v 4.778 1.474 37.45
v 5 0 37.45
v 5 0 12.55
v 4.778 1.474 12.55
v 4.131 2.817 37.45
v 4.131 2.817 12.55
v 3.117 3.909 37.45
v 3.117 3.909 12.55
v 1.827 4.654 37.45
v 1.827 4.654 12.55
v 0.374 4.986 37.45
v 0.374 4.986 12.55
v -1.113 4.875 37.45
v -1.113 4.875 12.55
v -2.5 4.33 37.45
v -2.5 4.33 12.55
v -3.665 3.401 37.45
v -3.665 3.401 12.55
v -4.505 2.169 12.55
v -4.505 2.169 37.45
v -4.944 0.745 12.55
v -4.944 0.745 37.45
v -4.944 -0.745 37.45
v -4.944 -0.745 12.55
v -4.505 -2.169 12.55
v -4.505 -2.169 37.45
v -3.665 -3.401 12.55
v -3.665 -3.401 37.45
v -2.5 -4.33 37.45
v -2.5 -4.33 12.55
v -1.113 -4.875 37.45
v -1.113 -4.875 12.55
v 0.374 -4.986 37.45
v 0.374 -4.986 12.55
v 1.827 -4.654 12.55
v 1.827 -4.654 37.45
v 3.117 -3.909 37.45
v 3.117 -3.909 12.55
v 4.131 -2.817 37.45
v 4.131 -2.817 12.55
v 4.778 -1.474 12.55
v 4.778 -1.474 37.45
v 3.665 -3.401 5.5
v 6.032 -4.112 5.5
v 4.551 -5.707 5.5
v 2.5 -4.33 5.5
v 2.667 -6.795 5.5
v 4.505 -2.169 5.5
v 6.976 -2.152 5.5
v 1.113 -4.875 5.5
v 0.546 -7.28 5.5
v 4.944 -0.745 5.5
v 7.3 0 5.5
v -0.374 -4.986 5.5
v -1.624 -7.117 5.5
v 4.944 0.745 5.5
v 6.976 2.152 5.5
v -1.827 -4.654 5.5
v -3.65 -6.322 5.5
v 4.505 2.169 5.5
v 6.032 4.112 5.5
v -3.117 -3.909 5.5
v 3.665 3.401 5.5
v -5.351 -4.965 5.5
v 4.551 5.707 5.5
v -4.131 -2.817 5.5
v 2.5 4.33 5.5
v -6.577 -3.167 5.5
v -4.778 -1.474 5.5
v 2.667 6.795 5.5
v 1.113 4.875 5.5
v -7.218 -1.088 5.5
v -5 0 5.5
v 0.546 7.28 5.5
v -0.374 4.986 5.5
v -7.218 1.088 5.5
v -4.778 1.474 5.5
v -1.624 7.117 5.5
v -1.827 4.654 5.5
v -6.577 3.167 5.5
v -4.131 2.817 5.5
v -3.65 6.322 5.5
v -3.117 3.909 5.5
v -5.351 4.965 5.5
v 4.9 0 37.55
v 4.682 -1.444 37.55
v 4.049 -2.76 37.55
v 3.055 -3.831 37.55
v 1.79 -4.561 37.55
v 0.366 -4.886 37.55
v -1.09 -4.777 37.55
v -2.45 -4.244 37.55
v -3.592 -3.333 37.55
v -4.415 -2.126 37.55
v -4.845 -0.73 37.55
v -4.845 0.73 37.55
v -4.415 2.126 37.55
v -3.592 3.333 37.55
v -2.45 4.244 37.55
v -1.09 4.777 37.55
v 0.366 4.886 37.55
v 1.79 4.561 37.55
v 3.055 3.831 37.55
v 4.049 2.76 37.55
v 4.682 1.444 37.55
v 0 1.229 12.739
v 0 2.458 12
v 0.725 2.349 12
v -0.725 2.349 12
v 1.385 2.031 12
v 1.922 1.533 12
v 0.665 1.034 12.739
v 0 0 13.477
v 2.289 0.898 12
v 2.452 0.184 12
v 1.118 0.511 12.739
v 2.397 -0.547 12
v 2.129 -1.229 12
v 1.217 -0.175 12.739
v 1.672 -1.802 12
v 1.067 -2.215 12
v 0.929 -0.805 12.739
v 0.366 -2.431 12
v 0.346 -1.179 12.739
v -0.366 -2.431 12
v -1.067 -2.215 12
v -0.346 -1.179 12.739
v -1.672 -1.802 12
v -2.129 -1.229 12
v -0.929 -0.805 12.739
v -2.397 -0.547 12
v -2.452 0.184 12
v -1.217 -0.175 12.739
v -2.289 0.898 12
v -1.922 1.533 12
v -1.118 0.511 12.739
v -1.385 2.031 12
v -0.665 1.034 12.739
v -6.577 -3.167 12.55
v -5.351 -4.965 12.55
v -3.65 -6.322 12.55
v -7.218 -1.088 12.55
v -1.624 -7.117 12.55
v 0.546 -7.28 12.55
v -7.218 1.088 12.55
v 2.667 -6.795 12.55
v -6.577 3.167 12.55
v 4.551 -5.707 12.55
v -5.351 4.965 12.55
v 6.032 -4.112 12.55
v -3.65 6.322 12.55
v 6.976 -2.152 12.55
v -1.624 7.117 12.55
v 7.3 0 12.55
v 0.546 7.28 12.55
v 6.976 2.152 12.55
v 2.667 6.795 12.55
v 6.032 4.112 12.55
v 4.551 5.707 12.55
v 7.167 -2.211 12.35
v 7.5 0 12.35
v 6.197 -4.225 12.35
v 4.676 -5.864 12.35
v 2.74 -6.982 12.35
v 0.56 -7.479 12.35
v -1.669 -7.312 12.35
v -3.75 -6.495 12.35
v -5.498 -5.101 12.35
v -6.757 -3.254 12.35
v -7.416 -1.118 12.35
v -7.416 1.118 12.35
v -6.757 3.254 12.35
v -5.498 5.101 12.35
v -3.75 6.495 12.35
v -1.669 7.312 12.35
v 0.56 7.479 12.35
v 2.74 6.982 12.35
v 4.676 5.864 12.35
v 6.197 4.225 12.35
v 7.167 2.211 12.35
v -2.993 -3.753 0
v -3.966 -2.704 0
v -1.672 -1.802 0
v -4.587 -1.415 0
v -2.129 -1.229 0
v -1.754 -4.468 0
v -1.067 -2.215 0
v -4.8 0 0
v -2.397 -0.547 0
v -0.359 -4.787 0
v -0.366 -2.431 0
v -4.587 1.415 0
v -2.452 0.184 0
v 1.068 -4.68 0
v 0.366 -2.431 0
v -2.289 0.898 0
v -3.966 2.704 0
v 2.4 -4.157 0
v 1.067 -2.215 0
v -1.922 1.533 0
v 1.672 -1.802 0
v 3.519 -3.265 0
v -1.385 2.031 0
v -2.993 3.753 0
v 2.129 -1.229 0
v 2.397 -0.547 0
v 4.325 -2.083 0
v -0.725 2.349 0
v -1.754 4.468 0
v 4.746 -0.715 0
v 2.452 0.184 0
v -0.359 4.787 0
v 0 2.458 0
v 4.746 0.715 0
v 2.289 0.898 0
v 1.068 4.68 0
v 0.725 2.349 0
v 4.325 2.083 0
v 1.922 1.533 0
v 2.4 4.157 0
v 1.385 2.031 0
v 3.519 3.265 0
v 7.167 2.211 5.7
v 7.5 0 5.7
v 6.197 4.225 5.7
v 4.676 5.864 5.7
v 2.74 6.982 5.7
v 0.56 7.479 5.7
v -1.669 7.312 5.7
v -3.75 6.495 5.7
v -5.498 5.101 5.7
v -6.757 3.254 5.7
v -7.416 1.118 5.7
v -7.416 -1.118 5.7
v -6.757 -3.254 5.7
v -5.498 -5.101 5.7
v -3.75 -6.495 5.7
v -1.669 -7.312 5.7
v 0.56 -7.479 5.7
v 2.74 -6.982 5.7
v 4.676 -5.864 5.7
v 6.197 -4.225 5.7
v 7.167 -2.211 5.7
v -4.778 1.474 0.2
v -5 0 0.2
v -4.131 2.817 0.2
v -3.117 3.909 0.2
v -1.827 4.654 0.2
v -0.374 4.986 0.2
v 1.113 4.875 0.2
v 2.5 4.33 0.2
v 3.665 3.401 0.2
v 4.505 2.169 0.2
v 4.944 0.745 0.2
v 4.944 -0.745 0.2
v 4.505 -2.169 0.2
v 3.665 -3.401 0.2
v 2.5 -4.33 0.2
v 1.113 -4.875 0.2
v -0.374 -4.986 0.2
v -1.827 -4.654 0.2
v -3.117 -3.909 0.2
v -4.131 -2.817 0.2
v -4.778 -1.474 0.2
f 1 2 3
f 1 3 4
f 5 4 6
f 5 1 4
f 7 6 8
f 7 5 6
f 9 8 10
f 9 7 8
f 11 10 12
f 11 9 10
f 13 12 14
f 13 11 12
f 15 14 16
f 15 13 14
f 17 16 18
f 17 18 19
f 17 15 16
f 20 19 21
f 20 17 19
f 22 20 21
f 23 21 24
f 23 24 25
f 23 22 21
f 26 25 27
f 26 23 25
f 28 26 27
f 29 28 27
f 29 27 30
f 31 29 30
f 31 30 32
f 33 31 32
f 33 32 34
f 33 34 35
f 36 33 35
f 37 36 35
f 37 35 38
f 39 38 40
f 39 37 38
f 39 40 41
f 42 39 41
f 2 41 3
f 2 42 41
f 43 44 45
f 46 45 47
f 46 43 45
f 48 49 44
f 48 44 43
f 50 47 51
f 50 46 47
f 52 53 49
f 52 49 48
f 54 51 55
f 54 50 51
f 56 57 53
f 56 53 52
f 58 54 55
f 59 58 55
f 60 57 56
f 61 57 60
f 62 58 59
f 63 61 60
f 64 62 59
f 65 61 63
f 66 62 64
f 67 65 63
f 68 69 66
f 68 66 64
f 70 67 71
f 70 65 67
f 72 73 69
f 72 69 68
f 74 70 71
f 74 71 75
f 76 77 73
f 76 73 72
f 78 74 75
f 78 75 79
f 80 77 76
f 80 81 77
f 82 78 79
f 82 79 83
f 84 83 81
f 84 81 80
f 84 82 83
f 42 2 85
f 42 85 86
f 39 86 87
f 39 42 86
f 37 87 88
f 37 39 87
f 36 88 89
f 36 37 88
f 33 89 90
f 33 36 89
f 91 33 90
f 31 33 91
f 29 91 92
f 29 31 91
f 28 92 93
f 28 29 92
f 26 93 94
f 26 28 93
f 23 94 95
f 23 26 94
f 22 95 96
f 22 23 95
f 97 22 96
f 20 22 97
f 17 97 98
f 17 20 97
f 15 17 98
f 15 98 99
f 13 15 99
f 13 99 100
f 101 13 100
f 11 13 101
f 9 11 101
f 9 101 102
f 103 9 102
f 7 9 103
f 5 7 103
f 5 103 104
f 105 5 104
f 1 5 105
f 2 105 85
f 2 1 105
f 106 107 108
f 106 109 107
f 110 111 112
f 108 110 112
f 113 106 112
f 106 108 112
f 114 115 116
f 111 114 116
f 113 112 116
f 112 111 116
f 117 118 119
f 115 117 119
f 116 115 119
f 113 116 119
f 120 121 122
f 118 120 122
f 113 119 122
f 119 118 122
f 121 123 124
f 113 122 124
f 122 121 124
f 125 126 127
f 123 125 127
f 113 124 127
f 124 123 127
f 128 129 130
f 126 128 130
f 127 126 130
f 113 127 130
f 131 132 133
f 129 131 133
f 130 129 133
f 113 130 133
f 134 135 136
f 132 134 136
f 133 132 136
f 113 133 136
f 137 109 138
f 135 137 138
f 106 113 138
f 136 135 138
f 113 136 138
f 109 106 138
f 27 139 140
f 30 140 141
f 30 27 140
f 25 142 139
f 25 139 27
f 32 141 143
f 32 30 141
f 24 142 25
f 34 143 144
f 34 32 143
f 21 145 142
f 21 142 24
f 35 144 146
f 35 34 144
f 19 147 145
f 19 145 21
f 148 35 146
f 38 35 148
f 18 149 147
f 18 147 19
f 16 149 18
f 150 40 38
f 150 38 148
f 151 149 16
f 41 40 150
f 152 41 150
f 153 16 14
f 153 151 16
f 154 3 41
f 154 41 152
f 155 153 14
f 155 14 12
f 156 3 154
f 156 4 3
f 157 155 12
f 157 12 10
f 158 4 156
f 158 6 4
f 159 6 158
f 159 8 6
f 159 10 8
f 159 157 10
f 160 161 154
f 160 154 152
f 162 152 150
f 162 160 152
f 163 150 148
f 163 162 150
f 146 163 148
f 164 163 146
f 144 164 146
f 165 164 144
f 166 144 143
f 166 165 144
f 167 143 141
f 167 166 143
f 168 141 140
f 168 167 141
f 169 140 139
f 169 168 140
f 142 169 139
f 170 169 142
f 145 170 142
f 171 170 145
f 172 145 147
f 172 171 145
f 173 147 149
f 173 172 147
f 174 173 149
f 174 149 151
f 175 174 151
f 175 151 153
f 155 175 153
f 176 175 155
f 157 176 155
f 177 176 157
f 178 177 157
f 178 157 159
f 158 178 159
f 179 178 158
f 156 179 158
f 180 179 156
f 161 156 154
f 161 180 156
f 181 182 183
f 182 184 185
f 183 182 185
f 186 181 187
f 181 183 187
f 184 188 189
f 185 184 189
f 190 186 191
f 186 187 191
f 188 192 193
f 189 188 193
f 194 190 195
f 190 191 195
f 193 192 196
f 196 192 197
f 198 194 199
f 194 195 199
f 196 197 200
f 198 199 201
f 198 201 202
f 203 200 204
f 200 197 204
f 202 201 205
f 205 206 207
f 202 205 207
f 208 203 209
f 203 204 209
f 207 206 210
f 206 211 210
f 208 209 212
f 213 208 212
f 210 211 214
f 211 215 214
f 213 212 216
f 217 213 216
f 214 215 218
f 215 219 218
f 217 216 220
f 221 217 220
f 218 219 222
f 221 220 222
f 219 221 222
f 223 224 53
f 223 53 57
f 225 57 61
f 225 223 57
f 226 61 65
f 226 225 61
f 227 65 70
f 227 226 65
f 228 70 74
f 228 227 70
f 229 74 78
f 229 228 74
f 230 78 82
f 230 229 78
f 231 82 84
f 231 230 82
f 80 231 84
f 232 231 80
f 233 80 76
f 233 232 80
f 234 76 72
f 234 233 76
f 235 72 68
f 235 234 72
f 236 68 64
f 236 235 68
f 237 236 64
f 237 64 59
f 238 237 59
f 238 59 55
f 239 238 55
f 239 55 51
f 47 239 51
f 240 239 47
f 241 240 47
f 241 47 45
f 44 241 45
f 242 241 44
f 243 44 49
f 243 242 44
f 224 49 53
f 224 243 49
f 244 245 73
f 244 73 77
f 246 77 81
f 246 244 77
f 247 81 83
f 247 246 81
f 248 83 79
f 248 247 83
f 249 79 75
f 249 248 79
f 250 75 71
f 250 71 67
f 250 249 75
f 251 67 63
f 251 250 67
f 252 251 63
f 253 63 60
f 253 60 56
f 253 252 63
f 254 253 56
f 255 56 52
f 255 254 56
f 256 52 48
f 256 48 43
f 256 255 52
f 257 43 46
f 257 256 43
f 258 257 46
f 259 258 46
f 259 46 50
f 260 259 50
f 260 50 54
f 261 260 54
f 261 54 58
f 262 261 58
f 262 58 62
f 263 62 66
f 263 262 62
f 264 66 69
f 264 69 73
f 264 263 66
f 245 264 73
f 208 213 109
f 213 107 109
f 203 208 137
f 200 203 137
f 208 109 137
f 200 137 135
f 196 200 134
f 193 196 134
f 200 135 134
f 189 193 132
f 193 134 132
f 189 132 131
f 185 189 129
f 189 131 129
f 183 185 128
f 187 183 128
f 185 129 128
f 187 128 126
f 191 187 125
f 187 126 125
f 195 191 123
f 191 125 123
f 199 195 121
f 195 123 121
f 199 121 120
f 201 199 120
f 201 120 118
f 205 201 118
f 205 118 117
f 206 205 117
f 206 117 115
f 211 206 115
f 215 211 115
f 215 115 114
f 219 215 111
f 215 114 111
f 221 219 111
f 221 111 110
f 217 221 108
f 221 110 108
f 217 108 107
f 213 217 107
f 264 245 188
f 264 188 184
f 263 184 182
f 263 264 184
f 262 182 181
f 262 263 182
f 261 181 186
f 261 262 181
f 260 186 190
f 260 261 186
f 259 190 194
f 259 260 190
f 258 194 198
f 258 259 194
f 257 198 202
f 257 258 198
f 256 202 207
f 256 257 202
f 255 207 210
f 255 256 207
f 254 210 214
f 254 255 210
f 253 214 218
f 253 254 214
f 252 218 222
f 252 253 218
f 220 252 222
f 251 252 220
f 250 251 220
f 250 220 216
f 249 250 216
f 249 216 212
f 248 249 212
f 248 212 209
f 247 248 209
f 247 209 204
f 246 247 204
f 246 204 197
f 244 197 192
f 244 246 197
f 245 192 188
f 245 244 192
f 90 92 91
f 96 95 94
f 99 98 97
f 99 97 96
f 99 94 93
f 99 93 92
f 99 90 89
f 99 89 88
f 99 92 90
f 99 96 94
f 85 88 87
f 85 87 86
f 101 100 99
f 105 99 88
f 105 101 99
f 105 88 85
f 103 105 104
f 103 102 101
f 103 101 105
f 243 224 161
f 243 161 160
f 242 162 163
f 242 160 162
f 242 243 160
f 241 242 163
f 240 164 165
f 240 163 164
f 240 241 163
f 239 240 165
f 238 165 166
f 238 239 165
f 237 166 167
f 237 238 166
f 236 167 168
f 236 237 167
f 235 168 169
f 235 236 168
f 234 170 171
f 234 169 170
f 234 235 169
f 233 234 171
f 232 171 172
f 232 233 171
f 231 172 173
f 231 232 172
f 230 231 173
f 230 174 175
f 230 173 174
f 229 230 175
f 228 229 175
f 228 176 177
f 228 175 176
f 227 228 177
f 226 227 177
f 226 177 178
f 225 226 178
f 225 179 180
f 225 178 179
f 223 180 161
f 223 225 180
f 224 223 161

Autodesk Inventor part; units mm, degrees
ref_plane "YZ Plane" through (0, 0, 0) normal (1, 0, 0) x (0, 1, 0)
ref_plane "XZ Plane" through (0, 0, 0) normal (0, 1, 0) x (-1, 0, 0)
ref_plane "XY Plane" through (0, 0, 0) normal (0, 0, 1) x (1, 0, 0)
sketch "Sketch1" plane through (0, 0, 0) normal (0, 0, 1) x (1, 0, 0)
  circle A0 centre (0, 0) radius 7.5
  dimension "Diameter" = 15
extrude "Extrusion1" add sketch "Sketch1" along normal blind 37.55
sketch "Sketch2" plane through (0, 0, 37.55) normal (0, 0, 1) x (1, 0, 0)
  circle A0 centre (0, 0) radius 5
  circle A1 centre (0, 0) radius 7.5 projected
  dimension "d3" = 10
extrude "Extrusion2" cut sketch "Sketch2" against normal blind 25
chamfer "Chamfer1" distance 0.1 angle 45 1 edges at (-5, 0, 37.55)
thread "Thread1" size "M10x1.5" class "6g" standard "ANSI Metric M Profile" length 25
sketch "Sketch3" plane through (0, 0, 0) normal (0, 0, -1) x (-1, 0, 0)
  circle A0 centre (0, 0) radius 5
  circle A1 centre (0, 0) radius 7.5 projected
  dimension "d11" = 10
extrude "Extrusion3" cut sketch "Sketch3" against normal blind 5.5
sketch "Sketch4" plane through (0, 0, 0) normal (0, 0, -1) x (-1, 0, 0)
  point P0 (0, 0)
  point P1 (0, 0)
hole "Hole1" at (0, 0, 0) direction (0, 0, 1) diameter 4.917 depth 12 tip angle 118 thread size "M6x1" class "6H" standard "ISO Metric profile"
chamfer "Chamfer2" distance 0.2 angle 45 3 edges at (5, 0, 0) (-7.5, 0, 5.5) (-7.5, 0, 12.55)
properties part number "Pully Shaft" material "Steel, Alloy"
